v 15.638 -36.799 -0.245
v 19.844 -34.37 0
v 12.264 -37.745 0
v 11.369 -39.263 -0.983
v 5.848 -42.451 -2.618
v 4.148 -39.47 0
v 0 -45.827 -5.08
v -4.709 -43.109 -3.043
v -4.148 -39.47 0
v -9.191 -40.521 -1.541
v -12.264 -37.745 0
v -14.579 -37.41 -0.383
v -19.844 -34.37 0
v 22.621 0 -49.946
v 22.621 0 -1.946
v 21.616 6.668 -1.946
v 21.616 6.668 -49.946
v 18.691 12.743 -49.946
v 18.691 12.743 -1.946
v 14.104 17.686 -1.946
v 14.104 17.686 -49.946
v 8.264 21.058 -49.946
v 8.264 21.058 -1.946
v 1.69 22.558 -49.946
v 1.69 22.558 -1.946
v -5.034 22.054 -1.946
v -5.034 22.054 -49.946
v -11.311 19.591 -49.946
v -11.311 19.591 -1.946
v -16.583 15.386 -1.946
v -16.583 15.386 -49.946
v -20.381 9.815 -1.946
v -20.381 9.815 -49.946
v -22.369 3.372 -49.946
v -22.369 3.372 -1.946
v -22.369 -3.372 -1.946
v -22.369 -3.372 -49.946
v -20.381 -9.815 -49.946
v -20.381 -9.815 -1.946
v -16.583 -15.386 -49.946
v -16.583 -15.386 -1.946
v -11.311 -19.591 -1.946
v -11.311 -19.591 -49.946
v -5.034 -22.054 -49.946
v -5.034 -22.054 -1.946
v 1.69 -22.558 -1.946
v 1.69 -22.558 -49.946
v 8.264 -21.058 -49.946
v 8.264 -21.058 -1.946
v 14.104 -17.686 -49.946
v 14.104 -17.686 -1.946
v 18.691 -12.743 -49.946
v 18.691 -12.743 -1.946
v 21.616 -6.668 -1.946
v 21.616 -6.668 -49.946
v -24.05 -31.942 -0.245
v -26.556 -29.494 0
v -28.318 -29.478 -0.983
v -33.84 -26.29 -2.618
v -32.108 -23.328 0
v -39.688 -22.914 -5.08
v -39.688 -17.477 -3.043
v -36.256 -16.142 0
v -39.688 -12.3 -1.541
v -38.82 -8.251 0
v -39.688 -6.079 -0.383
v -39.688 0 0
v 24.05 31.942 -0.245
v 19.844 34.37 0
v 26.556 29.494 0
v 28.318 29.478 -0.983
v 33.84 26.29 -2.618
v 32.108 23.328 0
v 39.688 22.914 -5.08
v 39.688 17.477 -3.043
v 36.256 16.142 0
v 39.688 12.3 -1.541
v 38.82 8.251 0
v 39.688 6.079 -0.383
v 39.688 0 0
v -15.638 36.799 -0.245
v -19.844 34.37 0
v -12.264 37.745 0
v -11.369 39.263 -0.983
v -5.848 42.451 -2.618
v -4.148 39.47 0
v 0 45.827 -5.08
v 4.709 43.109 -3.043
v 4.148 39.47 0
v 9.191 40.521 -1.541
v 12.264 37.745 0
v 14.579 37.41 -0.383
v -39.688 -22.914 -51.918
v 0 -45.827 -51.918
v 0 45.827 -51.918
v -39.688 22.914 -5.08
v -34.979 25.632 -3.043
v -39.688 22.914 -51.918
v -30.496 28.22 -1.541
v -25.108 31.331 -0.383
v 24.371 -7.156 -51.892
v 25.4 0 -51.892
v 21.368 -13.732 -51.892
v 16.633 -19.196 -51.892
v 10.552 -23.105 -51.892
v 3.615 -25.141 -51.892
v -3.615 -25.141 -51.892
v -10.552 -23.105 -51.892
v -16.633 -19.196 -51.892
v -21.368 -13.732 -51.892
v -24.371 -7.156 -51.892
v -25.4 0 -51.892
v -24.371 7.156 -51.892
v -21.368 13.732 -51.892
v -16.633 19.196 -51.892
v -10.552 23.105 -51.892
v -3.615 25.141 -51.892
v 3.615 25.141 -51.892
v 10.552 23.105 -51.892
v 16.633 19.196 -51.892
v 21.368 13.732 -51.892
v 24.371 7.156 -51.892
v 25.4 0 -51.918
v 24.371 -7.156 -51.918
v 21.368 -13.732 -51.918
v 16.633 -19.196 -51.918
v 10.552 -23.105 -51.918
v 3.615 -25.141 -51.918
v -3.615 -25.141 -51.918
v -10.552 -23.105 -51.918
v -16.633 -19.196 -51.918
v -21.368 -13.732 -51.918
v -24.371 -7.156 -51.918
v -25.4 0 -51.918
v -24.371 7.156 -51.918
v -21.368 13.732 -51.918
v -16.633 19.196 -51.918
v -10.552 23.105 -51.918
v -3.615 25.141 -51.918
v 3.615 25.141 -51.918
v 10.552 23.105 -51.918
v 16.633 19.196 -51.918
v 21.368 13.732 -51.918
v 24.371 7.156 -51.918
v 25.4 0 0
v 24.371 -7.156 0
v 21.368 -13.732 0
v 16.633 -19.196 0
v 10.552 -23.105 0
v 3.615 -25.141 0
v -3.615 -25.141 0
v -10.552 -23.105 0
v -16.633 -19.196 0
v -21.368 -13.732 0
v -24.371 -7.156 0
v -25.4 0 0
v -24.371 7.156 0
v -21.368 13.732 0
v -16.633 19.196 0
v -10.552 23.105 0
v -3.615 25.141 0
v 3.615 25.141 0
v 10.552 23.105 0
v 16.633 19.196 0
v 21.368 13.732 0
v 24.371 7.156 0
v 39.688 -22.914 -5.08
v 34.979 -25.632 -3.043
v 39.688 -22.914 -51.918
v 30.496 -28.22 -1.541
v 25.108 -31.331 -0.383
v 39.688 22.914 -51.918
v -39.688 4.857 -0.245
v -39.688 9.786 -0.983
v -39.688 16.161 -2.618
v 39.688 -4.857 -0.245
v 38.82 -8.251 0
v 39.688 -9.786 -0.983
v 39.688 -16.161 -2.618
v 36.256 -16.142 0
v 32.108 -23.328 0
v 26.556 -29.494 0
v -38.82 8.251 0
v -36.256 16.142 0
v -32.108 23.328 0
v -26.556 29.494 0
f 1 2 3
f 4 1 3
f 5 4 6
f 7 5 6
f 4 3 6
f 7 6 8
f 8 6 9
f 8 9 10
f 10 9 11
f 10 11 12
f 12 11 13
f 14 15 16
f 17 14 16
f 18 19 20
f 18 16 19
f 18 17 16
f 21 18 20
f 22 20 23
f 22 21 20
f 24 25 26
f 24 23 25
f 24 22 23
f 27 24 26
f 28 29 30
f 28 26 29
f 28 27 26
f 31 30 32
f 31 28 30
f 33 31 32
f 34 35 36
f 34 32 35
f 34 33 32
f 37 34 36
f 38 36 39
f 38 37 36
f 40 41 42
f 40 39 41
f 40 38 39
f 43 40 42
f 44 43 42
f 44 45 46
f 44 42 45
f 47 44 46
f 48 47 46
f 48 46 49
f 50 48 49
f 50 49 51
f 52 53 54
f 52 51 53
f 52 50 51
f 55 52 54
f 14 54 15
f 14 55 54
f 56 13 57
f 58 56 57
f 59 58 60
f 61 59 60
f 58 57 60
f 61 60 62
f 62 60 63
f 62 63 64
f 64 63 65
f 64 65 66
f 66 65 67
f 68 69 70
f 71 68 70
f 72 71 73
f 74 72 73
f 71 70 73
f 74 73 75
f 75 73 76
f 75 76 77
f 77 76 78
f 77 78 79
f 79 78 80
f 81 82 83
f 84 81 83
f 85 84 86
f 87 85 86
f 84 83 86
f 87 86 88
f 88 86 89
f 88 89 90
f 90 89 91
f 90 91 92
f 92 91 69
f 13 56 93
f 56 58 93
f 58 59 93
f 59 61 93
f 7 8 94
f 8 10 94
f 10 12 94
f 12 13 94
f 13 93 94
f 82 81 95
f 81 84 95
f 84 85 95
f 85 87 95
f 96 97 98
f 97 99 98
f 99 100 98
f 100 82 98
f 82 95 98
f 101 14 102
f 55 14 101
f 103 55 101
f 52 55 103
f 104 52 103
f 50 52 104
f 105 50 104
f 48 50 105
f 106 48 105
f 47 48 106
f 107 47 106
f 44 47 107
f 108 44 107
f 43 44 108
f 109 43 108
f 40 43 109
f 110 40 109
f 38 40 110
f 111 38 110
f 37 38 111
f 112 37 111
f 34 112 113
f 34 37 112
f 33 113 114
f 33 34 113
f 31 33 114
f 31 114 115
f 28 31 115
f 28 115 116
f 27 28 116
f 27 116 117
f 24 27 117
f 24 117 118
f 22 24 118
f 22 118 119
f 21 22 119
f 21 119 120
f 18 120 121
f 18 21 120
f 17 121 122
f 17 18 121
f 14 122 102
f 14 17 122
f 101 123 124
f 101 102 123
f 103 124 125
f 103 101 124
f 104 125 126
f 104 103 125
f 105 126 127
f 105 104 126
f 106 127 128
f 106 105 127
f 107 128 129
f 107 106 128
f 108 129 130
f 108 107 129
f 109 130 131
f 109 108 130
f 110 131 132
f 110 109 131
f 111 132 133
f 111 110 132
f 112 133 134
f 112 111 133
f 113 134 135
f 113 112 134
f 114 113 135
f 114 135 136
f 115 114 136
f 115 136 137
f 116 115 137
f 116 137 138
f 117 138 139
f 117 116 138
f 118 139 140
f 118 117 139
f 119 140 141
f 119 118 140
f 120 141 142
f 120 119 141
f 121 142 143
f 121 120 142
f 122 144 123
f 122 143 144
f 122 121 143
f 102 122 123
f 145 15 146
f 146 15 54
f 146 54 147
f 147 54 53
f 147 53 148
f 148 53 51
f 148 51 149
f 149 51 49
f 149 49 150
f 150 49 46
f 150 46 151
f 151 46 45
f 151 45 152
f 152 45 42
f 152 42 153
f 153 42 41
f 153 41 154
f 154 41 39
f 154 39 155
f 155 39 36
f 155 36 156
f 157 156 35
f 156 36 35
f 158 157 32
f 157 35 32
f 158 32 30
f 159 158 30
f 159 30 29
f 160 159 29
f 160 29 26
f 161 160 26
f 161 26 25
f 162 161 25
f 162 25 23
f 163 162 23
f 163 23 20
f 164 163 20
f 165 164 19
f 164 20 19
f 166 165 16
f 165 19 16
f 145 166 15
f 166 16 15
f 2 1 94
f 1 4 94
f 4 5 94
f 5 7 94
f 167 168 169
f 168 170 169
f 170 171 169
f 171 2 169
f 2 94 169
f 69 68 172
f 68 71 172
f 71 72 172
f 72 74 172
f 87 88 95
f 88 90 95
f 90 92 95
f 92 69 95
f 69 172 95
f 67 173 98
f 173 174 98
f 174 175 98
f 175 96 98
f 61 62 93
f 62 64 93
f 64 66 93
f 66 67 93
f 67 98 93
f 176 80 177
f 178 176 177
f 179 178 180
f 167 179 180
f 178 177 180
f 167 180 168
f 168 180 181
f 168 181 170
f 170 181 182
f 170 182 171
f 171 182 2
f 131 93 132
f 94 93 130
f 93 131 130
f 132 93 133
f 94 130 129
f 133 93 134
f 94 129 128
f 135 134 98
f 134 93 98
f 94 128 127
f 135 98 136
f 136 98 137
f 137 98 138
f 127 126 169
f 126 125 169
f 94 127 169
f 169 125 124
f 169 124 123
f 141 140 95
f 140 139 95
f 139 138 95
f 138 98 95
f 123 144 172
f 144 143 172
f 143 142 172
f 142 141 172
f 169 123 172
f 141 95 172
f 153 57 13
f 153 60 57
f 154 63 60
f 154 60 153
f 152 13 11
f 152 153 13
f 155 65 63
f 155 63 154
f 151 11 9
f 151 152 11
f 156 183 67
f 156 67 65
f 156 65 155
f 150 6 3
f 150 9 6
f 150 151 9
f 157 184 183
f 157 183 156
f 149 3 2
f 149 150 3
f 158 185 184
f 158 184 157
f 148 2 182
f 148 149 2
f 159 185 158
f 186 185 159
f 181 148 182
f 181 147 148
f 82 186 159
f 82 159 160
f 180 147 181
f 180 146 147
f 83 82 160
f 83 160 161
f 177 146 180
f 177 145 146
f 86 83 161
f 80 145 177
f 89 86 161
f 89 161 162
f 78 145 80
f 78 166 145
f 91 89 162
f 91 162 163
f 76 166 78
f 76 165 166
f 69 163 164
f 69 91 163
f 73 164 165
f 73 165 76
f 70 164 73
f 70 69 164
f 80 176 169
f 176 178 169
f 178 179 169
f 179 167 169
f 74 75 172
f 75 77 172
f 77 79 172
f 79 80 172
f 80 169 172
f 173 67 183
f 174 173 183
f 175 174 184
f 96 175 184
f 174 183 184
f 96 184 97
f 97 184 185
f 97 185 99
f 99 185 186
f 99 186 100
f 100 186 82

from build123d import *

# Parameters (mm, degrees)
THREADSCHEMATIC_START     = -51.9176
THREADSCHEMATIC_OUTLINE_R = 22.62124
THREADSCHEMATIC_DEPTH     = 51.9176


# Read off the part's stored shape, not the designer's step: ThreadSchematic
with BuildPart() as part:
    # ThreadSchematic outline → ThreadSchematic (new body)
    with BuildSketch(Plane.XY.offset(THREADSCHEMATIC_START)):
        Polygon((39.6875, 22.913588808), (0, 45.827177617), (-39.6875, 22.913588808), (-39.6875, -22.913588808), (0, -45.827177617), (39.6875, -22.913588808), align=None)
        Circle(THREADSCHEMATIC_OUTLINE_R, mode=Mode.SUBTRACT)
    extrude(amount=THREADSCHEMATIC_DEPTH)

    # Sketch2 → Single-Chamfer (revolve, cut)
    with BuildSketch(Plane(origin=(0, 0, 0), x_dir=(0, 0, -1), z_dir=(1, 0, 0))):
        Polygon((0, 39.6875), (-12.7, 39.6875), (-12.7, 58.527177617), (5.08, 58.527177617), (5.08, 45.827177617), align=None)
    revolve(axis=Axis((0, 0, 0), (0, 0, -1)), mode=Mode.SUBTRACT)

    # Sketch3 → EndChamfer (revolve, cut)
    with BuildSketch(Plane(origin=(0, 0, 0), x_dir=(0, 0, -1), z_dir=(1, 0, 0)), mode=Mode.PRIVATE) as endchamfer_sk:
        Polygon((51.8922, 25.4), (49.751920431, 22.343364), (51.943, 22.343364), (51.943, 25.4), align=None)
        Polygon((-0.0508, 25.4), (0, 25.4), (2.140279569, 22.343364), (-0.0508, 22.343364), align=None)
    revolve(endchamfer_sk.sketch.rotate(Axis((0, 0, -25.037505729), (0, 0, -1)), 90), axis=Axis((0, 0, -25.037505729), (0, 0, -1)), mode=Mode.SUBTRACT)


solid = part.part
